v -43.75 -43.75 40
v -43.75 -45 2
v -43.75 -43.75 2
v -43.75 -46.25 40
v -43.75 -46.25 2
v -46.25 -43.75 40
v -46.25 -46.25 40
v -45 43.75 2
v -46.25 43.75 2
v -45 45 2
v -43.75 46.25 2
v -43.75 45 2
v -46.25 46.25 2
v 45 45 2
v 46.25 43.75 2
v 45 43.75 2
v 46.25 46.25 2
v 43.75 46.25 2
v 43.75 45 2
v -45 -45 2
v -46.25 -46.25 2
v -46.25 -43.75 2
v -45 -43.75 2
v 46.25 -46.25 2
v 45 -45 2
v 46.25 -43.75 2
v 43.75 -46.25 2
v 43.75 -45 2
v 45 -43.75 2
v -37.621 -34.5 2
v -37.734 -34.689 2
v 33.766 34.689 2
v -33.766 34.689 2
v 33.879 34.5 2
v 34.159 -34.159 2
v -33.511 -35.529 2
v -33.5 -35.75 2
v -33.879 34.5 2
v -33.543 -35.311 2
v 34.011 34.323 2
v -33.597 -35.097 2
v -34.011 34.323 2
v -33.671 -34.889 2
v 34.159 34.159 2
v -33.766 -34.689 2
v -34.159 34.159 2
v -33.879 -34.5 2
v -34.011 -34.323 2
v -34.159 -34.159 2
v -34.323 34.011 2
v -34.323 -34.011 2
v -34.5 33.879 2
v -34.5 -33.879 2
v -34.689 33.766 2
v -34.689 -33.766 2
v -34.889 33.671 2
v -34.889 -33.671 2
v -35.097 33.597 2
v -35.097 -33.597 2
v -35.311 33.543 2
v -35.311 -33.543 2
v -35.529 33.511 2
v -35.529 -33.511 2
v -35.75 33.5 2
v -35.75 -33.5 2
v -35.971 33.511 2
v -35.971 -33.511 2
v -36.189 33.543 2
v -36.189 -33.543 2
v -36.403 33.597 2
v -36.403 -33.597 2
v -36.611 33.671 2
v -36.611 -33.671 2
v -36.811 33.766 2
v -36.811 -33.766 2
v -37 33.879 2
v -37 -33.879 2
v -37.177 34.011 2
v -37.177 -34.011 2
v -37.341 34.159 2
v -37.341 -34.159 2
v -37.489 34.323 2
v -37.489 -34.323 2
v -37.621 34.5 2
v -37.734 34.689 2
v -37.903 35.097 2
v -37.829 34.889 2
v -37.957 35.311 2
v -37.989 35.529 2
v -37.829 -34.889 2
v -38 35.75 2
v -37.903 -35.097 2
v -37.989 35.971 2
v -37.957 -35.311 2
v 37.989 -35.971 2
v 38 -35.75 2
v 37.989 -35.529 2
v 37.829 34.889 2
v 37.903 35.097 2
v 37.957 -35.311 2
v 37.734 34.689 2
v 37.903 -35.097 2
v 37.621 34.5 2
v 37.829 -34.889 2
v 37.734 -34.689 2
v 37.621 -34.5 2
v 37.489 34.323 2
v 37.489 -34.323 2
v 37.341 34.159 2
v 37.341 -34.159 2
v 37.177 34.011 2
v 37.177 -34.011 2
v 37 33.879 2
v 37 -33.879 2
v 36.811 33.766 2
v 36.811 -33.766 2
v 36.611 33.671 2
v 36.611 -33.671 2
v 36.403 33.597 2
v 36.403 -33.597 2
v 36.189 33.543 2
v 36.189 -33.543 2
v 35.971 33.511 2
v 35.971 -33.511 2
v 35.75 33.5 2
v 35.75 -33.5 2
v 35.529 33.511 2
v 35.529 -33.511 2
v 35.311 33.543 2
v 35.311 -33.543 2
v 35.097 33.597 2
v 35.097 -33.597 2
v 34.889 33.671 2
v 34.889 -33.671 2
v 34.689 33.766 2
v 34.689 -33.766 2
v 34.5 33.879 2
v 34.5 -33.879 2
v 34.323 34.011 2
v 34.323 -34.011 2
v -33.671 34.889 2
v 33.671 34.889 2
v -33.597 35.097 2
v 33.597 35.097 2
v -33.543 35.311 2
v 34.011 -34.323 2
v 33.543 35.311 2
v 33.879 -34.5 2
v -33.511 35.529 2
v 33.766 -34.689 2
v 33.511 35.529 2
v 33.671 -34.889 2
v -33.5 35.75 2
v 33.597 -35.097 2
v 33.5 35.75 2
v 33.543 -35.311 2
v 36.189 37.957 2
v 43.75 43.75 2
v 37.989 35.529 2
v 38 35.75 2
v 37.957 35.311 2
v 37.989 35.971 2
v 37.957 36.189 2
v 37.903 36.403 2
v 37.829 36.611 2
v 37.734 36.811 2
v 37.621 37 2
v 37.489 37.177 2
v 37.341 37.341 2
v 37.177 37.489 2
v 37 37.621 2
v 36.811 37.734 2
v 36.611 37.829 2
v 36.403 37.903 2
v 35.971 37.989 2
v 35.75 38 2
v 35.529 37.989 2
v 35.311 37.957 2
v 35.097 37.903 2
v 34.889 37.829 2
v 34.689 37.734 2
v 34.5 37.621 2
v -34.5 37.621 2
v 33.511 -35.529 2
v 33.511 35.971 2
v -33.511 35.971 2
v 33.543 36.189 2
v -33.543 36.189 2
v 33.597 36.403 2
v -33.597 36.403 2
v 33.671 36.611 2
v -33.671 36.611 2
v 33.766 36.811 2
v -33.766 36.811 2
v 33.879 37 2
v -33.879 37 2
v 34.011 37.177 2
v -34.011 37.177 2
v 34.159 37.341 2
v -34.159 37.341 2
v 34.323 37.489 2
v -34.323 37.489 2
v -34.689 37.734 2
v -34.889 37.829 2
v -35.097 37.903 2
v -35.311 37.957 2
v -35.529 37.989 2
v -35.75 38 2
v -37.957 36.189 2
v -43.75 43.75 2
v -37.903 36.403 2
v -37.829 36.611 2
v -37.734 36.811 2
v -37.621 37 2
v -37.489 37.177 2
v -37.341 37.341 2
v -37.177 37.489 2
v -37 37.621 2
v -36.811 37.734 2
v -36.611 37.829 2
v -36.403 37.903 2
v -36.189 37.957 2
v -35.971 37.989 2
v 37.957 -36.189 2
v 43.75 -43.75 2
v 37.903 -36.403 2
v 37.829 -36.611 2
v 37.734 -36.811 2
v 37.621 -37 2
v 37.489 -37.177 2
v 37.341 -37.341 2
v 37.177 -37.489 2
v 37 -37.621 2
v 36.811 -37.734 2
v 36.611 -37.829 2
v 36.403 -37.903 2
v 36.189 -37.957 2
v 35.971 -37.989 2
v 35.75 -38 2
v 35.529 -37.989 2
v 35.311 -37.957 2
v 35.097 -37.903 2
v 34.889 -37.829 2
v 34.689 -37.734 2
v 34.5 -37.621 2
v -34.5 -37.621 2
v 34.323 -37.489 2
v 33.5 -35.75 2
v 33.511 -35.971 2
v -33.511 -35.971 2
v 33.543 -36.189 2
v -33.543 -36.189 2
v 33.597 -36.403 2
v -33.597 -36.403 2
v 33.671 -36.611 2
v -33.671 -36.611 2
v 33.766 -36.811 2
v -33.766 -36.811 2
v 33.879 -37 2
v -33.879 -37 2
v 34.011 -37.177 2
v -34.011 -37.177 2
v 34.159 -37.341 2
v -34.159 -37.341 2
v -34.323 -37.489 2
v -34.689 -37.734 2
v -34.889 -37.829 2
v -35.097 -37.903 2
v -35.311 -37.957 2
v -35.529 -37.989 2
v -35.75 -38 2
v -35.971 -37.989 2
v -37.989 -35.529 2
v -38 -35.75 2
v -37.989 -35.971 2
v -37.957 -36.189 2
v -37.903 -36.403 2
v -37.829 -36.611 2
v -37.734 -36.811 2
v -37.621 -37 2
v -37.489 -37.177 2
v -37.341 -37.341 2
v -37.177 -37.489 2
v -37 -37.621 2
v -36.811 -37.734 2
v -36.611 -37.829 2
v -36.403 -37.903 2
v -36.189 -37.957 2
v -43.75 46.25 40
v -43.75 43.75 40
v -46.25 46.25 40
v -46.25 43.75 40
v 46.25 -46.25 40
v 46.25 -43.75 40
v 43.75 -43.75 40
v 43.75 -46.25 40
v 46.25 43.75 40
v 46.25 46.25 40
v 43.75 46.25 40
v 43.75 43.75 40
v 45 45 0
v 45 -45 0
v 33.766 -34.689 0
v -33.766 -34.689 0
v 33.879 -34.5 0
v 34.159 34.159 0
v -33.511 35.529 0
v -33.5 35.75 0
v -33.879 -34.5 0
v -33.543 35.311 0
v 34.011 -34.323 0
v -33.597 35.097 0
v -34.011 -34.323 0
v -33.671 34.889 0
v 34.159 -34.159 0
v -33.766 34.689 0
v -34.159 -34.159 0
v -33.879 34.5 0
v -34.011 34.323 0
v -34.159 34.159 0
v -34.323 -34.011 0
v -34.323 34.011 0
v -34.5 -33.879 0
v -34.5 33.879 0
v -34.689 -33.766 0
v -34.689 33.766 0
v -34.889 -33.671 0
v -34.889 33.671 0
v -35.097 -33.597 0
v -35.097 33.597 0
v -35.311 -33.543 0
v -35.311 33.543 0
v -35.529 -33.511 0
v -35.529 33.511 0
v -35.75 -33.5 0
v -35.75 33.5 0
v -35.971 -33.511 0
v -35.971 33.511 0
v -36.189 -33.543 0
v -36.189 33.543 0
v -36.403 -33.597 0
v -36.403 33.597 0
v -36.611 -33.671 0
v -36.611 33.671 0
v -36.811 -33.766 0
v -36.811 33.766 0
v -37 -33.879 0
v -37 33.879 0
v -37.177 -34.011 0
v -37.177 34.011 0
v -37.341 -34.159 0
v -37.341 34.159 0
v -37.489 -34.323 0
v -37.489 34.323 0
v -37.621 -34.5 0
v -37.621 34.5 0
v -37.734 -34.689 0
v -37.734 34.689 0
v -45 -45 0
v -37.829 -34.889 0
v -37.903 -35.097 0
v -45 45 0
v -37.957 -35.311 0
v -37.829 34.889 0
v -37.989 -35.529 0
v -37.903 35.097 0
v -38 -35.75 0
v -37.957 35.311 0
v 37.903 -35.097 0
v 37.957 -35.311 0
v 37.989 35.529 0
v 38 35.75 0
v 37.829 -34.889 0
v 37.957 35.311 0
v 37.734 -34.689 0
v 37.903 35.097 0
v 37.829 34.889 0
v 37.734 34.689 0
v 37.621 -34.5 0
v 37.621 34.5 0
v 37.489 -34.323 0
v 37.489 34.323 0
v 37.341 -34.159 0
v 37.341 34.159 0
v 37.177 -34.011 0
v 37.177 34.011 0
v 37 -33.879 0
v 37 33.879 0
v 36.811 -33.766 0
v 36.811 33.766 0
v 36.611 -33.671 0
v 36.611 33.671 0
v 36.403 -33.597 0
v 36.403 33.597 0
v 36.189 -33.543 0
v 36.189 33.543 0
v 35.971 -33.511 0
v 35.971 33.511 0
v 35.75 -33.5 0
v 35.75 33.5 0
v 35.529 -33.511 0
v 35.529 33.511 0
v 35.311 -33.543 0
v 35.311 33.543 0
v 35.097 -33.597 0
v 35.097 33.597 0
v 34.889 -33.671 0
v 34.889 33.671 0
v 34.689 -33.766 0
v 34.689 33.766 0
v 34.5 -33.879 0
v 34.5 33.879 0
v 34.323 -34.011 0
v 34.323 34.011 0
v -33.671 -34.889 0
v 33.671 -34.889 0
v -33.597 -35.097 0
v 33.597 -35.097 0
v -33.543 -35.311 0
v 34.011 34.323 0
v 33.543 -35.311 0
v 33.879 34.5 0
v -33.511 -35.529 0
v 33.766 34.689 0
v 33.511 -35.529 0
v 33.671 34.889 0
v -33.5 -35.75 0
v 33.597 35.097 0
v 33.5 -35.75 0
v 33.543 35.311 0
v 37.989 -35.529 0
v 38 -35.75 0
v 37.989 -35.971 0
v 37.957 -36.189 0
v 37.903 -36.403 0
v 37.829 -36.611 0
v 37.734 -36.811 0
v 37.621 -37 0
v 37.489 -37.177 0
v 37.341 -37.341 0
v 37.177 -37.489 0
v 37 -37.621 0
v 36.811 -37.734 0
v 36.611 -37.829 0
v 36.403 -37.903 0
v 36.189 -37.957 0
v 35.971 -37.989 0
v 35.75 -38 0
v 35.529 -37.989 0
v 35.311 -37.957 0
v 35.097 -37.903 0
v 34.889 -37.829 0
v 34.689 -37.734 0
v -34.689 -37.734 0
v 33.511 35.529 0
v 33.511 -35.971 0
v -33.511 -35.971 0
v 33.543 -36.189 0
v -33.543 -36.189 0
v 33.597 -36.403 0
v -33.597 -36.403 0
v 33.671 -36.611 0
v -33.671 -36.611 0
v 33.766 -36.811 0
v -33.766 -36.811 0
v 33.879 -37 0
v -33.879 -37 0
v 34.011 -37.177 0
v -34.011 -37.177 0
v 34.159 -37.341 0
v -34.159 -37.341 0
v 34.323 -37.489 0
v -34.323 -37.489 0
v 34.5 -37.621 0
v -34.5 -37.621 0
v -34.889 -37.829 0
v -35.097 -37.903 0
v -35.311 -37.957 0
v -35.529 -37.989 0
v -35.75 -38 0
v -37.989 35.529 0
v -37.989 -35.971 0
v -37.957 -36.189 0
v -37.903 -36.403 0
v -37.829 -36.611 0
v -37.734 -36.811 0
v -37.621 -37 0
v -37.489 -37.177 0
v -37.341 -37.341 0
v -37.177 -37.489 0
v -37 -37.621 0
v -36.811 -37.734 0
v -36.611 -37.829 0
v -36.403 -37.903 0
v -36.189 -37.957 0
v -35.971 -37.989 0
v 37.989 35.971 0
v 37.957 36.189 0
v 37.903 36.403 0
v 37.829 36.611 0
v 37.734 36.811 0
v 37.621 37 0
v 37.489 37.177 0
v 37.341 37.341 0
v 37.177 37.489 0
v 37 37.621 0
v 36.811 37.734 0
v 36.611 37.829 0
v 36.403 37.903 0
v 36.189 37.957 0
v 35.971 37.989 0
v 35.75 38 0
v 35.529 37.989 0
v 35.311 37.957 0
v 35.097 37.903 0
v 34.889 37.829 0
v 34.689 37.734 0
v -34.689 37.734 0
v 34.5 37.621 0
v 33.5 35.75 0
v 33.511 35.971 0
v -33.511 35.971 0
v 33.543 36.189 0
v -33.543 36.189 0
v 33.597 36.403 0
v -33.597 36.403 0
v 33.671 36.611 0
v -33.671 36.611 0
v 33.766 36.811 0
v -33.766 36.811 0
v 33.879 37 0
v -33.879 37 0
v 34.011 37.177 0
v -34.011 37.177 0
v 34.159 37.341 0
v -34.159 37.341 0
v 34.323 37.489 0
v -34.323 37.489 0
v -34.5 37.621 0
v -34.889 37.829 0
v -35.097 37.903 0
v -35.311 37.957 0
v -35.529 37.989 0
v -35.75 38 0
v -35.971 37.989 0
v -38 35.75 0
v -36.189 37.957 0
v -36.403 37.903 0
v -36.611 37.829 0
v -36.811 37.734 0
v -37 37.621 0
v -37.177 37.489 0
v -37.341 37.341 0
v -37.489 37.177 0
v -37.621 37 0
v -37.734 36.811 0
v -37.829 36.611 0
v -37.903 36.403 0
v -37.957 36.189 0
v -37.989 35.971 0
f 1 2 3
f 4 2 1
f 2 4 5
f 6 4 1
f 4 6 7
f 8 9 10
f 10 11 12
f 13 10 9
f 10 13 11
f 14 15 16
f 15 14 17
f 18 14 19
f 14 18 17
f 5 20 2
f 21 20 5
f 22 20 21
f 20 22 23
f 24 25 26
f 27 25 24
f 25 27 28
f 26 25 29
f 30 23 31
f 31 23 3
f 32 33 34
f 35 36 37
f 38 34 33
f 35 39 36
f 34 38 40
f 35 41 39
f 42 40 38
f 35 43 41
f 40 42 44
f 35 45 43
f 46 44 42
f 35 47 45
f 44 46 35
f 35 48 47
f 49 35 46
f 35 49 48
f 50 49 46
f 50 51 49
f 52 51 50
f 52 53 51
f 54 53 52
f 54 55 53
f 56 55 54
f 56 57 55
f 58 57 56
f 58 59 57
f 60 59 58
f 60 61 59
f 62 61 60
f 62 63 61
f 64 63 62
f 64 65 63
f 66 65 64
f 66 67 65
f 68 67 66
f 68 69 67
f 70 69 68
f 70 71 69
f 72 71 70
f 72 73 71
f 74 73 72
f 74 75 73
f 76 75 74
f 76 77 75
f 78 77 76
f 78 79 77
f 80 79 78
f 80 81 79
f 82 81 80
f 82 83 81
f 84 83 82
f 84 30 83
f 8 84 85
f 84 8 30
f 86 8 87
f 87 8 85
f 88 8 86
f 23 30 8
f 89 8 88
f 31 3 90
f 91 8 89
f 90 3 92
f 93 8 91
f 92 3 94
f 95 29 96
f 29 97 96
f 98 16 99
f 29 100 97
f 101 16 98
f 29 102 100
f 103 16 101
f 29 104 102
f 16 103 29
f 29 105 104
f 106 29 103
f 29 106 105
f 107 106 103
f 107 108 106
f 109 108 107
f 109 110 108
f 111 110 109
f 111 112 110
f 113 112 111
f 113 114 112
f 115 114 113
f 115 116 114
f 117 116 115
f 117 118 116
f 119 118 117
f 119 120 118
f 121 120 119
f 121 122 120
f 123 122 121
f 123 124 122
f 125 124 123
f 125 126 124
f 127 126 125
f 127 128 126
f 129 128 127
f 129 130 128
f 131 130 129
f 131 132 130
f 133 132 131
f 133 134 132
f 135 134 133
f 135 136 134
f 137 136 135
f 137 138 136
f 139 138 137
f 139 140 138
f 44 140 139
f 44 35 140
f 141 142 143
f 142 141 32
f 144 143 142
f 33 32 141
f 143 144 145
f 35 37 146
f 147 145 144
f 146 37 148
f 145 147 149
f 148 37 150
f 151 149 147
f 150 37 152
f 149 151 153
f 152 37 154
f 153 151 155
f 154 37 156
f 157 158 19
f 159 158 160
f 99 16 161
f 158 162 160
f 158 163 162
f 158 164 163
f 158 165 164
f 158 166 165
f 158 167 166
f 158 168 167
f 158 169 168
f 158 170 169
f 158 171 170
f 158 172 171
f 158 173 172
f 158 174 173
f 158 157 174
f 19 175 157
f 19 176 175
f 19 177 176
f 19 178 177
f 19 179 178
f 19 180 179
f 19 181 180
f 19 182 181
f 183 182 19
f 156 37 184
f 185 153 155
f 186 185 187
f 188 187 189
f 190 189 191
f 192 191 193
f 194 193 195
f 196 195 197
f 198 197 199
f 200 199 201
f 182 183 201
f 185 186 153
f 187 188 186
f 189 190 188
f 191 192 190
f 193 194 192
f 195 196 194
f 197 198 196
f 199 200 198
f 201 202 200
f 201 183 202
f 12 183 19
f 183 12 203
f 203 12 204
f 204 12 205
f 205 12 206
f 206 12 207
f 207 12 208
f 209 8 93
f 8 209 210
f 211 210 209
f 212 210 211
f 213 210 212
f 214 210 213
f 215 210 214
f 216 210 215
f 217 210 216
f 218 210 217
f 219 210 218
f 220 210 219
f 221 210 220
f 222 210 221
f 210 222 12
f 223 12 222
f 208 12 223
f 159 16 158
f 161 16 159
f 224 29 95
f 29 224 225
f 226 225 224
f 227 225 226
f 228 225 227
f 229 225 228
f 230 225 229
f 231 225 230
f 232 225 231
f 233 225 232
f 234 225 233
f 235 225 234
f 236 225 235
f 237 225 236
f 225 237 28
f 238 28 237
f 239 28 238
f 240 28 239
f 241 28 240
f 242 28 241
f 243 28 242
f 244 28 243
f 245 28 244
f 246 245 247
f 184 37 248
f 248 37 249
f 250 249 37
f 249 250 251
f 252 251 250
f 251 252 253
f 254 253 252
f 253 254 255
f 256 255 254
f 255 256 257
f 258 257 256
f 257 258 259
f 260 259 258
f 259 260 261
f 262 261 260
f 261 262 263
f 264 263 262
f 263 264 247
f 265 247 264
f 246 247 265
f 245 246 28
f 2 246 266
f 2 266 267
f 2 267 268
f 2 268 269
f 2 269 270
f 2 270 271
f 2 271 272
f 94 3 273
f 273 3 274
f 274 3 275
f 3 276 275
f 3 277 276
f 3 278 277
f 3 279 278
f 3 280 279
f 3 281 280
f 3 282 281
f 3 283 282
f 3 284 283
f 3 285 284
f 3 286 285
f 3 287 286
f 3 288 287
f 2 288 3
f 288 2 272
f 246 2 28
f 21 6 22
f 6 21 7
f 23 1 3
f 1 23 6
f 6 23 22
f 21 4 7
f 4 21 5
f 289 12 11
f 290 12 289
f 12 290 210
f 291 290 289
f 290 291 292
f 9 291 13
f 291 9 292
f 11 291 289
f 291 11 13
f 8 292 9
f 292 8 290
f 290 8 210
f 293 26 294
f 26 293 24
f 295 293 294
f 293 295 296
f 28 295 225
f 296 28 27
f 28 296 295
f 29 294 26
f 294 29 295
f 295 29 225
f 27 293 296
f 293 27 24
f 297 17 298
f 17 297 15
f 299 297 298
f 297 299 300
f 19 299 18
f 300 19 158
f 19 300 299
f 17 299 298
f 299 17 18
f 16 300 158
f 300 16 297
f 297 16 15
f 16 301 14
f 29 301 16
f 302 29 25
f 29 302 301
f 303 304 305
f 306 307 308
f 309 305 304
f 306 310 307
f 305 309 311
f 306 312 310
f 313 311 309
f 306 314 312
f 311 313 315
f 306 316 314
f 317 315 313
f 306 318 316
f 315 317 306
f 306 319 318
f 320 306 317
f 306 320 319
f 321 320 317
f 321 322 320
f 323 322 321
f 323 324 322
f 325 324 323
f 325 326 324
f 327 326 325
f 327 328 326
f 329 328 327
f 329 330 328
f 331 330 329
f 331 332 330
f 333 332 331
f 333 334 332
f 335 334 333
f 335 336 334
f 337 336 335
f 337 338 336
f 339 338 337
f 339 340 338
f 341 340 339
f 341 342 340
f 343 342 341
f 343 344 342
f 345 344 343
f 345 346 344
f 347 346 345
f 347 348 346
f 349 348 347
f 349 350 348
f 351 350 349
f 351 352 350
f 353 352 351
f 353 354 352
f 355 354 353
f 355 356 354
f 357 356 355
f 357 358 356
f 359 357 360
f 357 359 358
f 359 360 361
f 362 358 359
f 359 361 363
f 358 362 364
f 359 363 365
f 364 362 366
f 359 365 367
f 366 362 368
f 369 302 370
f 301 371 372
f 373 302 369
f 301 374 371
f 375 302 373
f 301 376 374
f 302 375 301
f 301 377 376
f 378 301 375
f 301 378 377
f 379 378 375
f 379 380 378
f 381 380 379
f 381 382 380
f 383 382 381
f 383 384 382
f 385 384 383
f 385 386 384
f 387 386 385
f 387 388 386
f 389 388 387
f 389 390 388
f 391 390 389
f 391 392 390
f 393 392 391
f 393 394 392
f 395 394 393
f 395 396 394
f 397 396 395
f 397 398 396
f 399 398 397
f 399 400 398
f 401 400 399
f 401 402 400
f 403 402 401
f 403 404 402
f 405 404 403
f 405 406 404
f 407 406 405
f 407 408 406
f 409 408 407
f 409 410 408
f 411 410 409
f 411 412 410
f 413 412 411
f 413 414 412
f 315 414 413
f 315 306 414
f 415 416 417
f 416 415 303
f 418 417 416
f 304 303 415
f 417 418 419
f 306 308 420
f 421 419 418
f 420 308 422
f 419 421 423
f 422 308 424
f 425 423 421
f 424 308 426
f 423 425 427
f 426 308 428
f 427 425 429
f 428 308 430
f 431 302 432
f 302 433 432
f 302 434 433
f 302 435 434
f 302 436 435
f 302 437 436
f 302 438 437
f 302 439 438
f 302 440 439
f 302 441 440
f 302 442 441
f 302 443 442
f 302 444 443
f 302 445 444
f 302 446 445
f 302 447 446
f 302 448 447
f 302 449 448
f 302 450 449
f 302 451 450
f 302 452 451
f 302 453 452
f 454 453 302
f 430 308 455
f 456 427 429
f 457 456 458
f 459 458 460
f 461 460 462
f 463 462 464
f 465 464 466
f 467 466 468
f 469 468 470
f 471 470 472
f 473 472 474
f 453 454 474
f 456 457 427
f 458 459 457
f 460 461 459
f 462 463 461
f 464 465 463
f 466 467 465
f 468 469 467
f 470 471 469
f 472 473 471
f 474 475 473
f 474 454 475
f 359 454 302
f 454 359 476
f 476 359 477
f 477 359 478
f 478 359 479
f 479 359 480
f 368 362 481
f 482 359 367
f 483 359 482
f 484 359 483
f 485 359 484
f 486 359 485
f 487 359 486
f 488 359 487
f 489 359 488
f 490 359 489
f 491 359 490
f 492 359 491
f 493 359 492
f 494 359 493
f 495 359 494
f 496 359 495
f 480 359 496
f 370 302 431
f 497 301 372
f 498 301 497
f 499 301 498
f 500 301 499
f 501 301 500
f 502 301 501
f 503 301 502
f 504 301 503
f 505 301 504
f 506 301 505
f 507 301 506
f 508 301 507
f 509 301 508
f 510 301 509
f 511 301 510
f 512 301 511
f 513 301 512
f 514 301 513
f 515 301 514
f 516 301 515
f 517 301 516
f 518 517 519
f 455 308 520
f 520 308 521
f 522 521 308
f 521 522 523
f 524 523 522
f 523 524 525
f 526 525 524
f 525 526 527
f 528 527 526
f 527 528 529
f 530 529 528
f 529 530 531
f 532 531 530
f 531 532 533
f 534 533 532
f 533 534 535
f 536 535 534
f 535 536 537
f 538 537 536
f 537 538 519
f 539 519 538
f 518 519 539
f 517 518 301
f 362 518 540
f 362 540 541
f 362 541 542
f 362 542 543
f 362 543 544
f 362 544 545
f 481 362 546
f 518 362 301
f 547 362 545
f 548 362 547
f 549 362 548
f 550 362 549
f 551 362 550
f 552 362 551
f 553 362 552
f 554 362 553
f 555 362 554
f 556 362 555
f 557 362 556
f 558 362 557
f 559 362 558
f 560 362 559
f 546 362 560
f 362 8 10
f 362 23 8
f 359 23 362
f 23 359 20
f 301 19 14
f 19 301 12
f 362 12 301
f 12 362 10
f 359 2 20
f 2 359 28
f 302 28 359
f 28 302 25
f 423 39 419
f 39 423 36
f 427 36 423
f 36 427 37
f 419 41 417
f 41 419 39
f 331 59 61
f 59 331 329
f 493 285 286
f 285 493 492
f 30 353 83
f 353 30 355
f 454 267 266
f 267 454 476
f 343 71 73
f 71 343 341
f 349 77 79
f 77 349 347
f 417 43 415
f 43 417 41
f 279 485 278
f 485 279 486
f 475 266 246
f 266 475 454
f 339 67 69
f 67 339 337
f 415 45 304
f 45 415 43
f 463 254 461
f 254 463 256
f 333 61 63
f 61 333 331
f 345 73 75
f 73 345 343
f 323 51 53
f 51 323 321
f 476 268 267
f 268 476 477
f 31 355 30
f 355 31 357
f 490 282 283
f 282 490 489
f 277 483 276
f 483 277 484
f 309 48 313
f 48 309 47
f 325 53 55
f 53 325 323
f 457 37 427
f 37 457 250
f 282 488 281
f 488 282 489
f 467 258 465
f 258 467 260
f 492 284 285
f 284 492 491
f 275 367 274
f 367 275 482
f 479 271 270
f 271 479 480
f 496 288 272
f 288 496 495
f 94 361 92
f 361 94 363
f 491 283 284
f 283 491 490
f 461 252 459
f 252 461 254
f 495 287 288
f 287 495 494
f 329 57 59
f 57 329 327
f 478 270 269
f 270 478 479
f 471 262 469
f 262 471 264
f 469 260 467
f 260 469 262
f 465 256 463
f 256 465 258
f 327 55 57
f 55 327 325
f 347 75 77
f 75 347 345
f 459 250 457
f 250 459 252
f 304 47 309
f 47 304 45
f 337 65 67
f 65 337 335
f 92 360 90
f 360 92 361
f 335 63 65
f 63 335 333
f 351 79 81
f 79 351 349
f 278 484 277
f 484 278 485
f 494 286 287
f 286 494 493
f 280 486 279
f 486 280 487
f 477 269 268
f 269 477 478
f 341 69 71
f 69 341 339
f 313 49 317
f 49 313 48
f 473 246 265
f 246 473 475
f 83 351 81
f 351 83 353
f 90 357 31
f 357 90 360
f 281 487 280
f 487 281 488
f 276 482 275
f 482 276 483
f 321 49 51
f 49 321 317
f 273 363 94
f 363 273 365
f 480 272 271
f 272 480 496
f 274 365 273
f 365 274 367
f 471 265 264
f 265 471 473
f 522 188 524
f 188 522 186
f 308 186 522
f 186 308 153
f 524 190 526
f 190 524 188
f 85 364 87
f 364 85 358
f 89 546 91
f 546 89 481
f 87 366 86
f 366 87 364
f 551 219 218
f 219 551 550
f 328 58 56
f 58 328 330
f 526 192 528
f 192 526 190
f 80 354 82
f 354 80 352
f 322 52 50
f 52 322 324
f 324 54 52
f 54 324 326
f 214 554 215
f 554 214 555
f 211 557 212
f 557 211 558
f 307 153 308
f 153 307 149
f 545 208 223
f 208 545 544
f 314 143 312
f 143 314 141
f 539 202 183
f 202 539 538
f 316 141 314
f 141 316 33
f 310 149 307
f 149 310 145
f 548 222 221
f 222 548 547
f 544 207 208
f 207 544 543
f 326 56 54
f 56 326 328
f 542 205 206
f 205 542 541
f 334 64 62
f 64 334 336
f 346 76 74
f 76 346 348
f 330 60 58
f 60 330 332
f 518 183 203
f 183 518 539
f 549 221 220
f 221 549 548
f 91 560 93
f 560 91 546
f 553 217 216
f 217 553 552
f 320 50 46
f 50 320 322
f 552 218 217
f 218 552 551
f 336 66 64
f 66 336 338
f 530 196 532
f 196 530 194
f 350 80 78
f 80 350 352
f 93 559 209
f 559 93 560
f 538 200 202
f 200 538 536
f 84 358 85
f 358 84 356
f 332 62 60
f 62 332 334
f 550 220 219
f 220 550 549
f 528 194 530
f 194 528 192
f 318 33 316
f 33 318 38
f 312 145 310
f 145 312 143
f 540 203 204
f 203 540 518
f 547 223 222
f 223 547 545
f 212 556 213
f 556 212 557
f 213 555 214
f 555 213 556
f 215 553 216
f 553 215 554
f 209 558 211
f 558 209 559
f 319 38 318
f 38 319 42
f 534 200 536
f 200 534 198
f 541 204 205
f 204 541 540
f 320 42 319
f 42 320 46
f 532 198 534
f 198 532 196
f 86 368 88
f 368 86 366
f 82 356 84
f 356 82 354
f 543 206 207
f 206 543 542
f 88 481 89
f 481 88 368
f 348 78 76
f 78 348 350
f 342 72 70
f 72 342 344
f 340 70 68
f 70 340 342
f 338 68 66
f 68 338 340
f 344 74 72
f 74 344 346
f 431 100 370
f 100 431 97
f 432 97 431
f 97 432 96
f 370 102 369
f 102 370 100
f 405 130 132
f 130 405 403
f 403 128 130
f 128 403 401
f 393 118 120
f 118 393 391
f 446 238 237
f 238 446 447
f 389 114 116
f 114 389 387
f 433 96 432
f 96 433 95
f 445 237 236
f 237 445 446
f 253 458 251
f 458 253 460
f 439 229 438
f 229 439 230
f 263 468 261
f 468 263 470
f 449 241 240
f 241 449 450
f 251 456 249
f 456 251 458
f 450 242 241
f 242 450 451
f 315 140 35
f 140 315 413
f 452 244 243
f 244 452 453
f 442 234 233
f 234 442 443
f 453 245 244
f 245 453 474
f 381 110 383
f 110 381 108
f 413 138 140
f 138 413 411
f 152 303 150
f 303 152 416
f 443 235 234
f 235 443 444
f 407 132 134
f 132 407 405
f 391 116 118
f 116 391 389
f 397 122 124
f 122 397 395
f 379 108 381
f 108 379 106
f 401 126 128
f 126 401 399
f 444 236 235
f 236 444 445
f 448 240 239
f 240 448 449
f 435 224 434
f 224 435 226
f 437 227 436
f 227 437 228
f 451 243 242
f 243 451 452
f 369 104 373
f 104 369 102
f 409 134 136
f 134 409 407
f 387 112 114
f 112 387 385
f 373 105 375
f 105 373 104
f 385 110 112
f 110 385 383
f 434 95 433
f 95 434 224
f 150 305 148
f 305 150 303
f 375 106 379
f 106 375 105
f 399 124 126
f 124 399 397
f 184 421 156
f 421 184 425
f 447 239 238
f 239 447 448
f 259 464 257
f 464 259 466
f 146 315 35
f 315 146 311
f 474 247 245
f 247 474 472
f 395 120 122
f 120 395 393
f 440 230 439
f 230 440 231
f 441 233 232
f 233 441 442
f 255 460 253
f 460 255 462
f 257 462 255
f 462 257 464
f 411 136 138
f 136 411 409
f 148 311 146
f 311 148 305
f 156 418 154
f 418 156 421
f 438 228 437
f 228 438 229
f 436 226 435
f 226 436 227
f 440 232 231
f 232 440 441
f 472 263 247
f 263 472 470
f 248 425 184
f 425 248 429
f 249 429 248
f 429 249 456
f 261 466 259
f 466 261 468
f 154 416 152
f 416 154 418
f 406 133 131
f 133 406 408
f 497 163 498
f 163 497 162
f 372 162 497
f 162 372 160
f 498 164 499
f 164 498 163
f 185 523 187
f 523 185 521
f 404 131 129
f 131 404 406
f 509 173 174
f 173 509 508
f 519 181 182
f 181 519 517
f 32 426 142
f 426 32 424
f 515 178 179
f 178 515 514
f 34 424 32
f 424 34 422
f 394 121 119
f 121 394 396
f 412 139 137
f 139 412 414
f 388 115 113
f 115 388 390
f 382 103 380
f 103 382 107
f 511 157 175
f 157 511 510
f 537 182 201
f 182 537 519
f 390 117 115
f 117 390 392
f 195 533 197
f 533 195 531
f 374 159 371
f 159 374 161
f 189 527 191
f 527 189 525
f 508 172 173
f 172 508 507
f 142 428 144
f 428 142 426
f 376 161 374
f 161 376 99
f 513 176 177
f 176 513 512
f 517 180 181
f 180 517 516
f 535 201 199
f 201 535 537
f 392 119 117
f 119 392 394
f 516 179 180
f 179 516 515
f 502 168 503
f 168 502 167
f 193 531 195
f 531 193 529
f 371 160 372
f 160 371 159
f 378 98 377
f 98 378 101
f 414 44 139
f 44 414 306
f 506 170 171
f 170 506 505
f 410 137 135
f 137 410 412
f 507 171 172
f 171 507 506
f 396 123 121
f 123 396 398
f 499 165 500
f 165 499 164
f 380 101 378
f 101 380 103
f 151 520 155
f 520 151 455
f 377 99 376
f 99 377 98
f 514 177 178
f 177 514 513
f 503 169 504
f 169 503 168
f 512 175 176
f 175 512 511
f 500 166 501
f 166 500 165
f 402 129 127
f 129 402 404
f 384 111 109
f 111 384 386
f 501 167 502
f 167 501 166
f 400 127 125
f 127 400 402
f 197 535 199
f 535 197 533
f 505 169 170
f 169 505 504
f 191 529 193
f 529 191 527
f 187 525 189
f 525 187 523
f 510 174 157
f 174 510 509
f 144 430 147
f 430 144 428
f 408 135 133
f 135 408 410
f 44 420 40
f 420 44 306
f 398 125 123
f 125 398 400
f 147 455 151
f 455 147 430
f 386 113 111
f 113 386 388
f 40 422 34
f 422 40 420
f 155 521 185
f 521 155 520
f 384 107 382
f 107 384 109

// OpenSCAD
// DIY magnetic stirrer housing - print orientation (upside down)
// Units: mm

// ---------- Parameters ----------
top_thickness      = 2;     // top plate thickness (z = 0 to 2)
wall_thickness     = 2.5;   // wall thickness
box_height         = 40;    // total height of box (open at top)
outer_size         = 90;    // outer X and Y size of box
screw_hole_d       = 4.5;   // M4 screw hole diameter
screw_hole_pitch   = 71.5;  // square pattern diagonal (centre to centre)
cable_notch_w      = 12;    // cable notch width
cable_notch_depth  = 8;     // cable notch depth from open edge (z = 32 to z = 40)
eps                = 0.5;   // cutter overshoot past faces

$fn = 64;

// ---------- Model ----------
difference() {
    union() {
        // Top plate (lies on bed)
        translate([-outer_size/2, -outer_size/2, 0])
            cube([outer_size, outer_size, top_thickness]);

        // Four walls rising from plate to open top
        for (x = [-outer_size/2, outer_size/2])
            for (y = [-outer_size/2, outer_size/2])
                translate([x - wall_thickness/2, y - wall_thickness/2, top_thickness])
                    cube([wall_thickness, wall_thickness, box_height - top_thickness]);
    }

    // Four M4 screw holes through top plate, centred square pattern
    for (sx = [-1, 1], sy = [-1, 1])
        translate([sx * screw_hole_pitch/2, sy * screw_hole_pitch/2, -eps])
            cylinder(d = screw_hole_d, h = top_thickness + 2*eps);

    // Cable notch in one wall: 12 mm wide, centred along wall,
    // reaching 8 mm down from open edge (z = 32 to z = 40)
    translate([-outer_size/2 + wall_thickness/2, 0, box_height - cable_notch_depth])
        cube([cable_notch_w, outer_size/3 - wall_thickness/2 - eps, cable_notch_depth + eps]);
}
